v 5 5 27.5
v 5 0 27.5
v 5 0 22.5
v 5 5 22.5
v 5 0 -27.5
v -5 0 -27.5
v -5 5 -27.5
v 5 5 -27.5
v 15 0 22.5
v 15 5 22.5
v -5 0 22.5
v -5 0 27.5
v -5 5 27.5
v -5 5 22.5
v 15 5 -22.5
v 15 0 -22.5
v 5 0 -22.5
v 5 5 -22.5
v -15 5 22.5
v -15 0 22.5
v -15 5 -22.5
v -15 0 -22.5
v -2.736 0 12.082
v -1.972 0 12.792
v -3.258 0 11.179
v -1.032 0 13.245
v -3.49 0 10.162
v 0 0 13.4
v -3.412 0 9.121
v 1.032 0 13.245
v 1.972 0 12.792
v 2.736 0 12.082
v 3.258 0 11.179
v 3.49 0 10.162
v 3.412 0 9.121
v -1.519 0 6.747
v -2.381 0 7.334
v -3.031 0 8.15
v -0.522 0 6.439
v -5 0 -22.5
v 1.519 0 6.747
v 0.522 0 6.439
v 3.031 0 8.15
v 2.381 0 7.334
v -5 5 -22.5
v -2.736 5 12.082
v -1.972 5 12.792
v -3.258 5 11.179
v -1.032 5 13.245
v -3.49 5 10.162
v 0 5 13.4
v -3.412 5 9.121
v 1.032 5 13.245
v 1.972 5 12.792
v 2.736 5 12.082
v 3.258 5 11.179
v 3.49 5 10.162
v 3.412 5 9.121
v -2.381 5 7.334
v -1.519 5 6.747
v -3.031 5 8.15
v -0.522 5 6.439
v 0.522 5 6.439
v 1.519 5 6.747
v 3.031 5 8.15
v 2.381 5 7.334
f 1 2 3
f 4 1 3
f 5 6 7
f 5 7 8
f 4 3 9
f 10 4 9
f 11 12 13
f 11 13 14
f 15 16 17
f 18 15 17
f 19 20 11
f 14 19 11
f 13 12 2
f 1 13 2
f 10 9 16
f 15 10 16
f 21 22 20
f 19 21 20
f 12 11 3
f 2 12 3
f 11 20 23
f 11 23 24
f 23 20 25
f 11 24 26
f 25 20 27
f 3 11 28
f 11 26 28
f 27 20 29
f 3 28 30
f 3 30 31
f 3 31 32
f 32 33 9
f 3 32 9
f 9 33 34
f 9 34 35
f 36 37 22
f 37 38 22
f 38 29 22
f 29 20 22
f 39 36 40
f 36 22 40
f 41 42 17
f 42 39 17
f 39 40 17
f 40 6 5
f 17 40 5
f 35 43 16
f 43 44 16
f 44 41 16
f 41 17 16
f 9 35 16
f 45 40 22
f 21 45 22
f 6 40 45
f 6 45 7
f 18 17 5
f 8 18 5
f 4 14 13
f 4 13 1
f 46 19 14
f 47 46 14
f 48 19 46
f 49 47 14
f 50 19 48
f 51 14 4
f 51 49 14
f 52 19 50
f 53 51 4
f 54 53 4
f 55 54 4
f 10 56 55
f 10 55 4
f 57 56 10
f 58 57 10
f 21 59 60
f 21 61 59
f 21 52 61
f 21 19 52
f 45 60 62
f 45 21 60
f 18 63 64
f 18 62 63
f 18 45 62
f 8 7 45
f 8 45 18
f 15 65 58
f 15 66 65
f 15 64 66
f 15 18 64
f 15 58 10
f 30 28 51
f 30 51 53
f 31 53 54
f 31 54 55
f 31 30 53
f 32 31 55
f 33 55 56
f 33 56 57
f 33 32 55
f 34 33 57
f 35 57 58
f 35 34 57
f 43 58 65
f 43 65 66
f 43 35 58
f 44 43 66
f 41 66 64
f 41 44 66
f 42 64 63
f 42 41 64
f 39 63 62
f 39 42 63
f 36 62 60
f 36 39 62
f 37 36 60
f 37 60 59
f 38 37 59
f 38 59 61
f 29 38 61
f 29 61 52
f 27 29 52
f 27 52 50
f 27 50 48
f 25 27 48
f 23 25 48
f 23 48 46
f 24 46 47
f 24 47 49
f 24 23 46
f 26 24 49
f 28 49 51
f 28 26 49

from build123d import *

# Parameters (mm, degrees)
SKETCH1_R           = 3.5
SKETCH1_W           = 10
SKETCH1_H           = 5
BOSS_EXTRUDE1_DEPTH = 5


with BuildPart() as part:
    # Sketch1 → Boss-Extrude1 (new body)
    # profile 1 of 3: a face of its own
    with BuildSketch(Plane(origin=(0, 0, 0), x_dir=(1, 0, 0), z_dir=(0, 1, 0))):
        Polygon((15, -22.5), (15, 22.5), (5, 22.5), (-5, 22.5), (-15, 22.5), (-15, -22.5), (-5, -22.5), (5, -22.5), align=None)
        with Locations(Location((0, -9.9, 0), (0, 0, 270))):
            Circle(SKETCH1_R, mode=Mode.SUBTRACT)
    # profile 2 of 3: a face of its own
    with BuildSketch(Plane(origin=(0, 0, 0), x_dir=(1, 0, 0), z_dir=(0, 1, 0))):
        with Locations((0, -25)):
            Rectangle(SKETCH1_W, SKETCH1_H)
    # profile 3 of 3: a face of its own
    with BuildSketch(Plane(origin=(0, 0, 0), x_dir=(1, 0, 0), z_dir=(0, 1, 0))):
        with Locations((0, 25)):
            Rectangle(SKETCH1_W, SKETCH1_H)
    extrude(amount=BOSS_EXTRUDE1_DEPTH)


solid = part.part
